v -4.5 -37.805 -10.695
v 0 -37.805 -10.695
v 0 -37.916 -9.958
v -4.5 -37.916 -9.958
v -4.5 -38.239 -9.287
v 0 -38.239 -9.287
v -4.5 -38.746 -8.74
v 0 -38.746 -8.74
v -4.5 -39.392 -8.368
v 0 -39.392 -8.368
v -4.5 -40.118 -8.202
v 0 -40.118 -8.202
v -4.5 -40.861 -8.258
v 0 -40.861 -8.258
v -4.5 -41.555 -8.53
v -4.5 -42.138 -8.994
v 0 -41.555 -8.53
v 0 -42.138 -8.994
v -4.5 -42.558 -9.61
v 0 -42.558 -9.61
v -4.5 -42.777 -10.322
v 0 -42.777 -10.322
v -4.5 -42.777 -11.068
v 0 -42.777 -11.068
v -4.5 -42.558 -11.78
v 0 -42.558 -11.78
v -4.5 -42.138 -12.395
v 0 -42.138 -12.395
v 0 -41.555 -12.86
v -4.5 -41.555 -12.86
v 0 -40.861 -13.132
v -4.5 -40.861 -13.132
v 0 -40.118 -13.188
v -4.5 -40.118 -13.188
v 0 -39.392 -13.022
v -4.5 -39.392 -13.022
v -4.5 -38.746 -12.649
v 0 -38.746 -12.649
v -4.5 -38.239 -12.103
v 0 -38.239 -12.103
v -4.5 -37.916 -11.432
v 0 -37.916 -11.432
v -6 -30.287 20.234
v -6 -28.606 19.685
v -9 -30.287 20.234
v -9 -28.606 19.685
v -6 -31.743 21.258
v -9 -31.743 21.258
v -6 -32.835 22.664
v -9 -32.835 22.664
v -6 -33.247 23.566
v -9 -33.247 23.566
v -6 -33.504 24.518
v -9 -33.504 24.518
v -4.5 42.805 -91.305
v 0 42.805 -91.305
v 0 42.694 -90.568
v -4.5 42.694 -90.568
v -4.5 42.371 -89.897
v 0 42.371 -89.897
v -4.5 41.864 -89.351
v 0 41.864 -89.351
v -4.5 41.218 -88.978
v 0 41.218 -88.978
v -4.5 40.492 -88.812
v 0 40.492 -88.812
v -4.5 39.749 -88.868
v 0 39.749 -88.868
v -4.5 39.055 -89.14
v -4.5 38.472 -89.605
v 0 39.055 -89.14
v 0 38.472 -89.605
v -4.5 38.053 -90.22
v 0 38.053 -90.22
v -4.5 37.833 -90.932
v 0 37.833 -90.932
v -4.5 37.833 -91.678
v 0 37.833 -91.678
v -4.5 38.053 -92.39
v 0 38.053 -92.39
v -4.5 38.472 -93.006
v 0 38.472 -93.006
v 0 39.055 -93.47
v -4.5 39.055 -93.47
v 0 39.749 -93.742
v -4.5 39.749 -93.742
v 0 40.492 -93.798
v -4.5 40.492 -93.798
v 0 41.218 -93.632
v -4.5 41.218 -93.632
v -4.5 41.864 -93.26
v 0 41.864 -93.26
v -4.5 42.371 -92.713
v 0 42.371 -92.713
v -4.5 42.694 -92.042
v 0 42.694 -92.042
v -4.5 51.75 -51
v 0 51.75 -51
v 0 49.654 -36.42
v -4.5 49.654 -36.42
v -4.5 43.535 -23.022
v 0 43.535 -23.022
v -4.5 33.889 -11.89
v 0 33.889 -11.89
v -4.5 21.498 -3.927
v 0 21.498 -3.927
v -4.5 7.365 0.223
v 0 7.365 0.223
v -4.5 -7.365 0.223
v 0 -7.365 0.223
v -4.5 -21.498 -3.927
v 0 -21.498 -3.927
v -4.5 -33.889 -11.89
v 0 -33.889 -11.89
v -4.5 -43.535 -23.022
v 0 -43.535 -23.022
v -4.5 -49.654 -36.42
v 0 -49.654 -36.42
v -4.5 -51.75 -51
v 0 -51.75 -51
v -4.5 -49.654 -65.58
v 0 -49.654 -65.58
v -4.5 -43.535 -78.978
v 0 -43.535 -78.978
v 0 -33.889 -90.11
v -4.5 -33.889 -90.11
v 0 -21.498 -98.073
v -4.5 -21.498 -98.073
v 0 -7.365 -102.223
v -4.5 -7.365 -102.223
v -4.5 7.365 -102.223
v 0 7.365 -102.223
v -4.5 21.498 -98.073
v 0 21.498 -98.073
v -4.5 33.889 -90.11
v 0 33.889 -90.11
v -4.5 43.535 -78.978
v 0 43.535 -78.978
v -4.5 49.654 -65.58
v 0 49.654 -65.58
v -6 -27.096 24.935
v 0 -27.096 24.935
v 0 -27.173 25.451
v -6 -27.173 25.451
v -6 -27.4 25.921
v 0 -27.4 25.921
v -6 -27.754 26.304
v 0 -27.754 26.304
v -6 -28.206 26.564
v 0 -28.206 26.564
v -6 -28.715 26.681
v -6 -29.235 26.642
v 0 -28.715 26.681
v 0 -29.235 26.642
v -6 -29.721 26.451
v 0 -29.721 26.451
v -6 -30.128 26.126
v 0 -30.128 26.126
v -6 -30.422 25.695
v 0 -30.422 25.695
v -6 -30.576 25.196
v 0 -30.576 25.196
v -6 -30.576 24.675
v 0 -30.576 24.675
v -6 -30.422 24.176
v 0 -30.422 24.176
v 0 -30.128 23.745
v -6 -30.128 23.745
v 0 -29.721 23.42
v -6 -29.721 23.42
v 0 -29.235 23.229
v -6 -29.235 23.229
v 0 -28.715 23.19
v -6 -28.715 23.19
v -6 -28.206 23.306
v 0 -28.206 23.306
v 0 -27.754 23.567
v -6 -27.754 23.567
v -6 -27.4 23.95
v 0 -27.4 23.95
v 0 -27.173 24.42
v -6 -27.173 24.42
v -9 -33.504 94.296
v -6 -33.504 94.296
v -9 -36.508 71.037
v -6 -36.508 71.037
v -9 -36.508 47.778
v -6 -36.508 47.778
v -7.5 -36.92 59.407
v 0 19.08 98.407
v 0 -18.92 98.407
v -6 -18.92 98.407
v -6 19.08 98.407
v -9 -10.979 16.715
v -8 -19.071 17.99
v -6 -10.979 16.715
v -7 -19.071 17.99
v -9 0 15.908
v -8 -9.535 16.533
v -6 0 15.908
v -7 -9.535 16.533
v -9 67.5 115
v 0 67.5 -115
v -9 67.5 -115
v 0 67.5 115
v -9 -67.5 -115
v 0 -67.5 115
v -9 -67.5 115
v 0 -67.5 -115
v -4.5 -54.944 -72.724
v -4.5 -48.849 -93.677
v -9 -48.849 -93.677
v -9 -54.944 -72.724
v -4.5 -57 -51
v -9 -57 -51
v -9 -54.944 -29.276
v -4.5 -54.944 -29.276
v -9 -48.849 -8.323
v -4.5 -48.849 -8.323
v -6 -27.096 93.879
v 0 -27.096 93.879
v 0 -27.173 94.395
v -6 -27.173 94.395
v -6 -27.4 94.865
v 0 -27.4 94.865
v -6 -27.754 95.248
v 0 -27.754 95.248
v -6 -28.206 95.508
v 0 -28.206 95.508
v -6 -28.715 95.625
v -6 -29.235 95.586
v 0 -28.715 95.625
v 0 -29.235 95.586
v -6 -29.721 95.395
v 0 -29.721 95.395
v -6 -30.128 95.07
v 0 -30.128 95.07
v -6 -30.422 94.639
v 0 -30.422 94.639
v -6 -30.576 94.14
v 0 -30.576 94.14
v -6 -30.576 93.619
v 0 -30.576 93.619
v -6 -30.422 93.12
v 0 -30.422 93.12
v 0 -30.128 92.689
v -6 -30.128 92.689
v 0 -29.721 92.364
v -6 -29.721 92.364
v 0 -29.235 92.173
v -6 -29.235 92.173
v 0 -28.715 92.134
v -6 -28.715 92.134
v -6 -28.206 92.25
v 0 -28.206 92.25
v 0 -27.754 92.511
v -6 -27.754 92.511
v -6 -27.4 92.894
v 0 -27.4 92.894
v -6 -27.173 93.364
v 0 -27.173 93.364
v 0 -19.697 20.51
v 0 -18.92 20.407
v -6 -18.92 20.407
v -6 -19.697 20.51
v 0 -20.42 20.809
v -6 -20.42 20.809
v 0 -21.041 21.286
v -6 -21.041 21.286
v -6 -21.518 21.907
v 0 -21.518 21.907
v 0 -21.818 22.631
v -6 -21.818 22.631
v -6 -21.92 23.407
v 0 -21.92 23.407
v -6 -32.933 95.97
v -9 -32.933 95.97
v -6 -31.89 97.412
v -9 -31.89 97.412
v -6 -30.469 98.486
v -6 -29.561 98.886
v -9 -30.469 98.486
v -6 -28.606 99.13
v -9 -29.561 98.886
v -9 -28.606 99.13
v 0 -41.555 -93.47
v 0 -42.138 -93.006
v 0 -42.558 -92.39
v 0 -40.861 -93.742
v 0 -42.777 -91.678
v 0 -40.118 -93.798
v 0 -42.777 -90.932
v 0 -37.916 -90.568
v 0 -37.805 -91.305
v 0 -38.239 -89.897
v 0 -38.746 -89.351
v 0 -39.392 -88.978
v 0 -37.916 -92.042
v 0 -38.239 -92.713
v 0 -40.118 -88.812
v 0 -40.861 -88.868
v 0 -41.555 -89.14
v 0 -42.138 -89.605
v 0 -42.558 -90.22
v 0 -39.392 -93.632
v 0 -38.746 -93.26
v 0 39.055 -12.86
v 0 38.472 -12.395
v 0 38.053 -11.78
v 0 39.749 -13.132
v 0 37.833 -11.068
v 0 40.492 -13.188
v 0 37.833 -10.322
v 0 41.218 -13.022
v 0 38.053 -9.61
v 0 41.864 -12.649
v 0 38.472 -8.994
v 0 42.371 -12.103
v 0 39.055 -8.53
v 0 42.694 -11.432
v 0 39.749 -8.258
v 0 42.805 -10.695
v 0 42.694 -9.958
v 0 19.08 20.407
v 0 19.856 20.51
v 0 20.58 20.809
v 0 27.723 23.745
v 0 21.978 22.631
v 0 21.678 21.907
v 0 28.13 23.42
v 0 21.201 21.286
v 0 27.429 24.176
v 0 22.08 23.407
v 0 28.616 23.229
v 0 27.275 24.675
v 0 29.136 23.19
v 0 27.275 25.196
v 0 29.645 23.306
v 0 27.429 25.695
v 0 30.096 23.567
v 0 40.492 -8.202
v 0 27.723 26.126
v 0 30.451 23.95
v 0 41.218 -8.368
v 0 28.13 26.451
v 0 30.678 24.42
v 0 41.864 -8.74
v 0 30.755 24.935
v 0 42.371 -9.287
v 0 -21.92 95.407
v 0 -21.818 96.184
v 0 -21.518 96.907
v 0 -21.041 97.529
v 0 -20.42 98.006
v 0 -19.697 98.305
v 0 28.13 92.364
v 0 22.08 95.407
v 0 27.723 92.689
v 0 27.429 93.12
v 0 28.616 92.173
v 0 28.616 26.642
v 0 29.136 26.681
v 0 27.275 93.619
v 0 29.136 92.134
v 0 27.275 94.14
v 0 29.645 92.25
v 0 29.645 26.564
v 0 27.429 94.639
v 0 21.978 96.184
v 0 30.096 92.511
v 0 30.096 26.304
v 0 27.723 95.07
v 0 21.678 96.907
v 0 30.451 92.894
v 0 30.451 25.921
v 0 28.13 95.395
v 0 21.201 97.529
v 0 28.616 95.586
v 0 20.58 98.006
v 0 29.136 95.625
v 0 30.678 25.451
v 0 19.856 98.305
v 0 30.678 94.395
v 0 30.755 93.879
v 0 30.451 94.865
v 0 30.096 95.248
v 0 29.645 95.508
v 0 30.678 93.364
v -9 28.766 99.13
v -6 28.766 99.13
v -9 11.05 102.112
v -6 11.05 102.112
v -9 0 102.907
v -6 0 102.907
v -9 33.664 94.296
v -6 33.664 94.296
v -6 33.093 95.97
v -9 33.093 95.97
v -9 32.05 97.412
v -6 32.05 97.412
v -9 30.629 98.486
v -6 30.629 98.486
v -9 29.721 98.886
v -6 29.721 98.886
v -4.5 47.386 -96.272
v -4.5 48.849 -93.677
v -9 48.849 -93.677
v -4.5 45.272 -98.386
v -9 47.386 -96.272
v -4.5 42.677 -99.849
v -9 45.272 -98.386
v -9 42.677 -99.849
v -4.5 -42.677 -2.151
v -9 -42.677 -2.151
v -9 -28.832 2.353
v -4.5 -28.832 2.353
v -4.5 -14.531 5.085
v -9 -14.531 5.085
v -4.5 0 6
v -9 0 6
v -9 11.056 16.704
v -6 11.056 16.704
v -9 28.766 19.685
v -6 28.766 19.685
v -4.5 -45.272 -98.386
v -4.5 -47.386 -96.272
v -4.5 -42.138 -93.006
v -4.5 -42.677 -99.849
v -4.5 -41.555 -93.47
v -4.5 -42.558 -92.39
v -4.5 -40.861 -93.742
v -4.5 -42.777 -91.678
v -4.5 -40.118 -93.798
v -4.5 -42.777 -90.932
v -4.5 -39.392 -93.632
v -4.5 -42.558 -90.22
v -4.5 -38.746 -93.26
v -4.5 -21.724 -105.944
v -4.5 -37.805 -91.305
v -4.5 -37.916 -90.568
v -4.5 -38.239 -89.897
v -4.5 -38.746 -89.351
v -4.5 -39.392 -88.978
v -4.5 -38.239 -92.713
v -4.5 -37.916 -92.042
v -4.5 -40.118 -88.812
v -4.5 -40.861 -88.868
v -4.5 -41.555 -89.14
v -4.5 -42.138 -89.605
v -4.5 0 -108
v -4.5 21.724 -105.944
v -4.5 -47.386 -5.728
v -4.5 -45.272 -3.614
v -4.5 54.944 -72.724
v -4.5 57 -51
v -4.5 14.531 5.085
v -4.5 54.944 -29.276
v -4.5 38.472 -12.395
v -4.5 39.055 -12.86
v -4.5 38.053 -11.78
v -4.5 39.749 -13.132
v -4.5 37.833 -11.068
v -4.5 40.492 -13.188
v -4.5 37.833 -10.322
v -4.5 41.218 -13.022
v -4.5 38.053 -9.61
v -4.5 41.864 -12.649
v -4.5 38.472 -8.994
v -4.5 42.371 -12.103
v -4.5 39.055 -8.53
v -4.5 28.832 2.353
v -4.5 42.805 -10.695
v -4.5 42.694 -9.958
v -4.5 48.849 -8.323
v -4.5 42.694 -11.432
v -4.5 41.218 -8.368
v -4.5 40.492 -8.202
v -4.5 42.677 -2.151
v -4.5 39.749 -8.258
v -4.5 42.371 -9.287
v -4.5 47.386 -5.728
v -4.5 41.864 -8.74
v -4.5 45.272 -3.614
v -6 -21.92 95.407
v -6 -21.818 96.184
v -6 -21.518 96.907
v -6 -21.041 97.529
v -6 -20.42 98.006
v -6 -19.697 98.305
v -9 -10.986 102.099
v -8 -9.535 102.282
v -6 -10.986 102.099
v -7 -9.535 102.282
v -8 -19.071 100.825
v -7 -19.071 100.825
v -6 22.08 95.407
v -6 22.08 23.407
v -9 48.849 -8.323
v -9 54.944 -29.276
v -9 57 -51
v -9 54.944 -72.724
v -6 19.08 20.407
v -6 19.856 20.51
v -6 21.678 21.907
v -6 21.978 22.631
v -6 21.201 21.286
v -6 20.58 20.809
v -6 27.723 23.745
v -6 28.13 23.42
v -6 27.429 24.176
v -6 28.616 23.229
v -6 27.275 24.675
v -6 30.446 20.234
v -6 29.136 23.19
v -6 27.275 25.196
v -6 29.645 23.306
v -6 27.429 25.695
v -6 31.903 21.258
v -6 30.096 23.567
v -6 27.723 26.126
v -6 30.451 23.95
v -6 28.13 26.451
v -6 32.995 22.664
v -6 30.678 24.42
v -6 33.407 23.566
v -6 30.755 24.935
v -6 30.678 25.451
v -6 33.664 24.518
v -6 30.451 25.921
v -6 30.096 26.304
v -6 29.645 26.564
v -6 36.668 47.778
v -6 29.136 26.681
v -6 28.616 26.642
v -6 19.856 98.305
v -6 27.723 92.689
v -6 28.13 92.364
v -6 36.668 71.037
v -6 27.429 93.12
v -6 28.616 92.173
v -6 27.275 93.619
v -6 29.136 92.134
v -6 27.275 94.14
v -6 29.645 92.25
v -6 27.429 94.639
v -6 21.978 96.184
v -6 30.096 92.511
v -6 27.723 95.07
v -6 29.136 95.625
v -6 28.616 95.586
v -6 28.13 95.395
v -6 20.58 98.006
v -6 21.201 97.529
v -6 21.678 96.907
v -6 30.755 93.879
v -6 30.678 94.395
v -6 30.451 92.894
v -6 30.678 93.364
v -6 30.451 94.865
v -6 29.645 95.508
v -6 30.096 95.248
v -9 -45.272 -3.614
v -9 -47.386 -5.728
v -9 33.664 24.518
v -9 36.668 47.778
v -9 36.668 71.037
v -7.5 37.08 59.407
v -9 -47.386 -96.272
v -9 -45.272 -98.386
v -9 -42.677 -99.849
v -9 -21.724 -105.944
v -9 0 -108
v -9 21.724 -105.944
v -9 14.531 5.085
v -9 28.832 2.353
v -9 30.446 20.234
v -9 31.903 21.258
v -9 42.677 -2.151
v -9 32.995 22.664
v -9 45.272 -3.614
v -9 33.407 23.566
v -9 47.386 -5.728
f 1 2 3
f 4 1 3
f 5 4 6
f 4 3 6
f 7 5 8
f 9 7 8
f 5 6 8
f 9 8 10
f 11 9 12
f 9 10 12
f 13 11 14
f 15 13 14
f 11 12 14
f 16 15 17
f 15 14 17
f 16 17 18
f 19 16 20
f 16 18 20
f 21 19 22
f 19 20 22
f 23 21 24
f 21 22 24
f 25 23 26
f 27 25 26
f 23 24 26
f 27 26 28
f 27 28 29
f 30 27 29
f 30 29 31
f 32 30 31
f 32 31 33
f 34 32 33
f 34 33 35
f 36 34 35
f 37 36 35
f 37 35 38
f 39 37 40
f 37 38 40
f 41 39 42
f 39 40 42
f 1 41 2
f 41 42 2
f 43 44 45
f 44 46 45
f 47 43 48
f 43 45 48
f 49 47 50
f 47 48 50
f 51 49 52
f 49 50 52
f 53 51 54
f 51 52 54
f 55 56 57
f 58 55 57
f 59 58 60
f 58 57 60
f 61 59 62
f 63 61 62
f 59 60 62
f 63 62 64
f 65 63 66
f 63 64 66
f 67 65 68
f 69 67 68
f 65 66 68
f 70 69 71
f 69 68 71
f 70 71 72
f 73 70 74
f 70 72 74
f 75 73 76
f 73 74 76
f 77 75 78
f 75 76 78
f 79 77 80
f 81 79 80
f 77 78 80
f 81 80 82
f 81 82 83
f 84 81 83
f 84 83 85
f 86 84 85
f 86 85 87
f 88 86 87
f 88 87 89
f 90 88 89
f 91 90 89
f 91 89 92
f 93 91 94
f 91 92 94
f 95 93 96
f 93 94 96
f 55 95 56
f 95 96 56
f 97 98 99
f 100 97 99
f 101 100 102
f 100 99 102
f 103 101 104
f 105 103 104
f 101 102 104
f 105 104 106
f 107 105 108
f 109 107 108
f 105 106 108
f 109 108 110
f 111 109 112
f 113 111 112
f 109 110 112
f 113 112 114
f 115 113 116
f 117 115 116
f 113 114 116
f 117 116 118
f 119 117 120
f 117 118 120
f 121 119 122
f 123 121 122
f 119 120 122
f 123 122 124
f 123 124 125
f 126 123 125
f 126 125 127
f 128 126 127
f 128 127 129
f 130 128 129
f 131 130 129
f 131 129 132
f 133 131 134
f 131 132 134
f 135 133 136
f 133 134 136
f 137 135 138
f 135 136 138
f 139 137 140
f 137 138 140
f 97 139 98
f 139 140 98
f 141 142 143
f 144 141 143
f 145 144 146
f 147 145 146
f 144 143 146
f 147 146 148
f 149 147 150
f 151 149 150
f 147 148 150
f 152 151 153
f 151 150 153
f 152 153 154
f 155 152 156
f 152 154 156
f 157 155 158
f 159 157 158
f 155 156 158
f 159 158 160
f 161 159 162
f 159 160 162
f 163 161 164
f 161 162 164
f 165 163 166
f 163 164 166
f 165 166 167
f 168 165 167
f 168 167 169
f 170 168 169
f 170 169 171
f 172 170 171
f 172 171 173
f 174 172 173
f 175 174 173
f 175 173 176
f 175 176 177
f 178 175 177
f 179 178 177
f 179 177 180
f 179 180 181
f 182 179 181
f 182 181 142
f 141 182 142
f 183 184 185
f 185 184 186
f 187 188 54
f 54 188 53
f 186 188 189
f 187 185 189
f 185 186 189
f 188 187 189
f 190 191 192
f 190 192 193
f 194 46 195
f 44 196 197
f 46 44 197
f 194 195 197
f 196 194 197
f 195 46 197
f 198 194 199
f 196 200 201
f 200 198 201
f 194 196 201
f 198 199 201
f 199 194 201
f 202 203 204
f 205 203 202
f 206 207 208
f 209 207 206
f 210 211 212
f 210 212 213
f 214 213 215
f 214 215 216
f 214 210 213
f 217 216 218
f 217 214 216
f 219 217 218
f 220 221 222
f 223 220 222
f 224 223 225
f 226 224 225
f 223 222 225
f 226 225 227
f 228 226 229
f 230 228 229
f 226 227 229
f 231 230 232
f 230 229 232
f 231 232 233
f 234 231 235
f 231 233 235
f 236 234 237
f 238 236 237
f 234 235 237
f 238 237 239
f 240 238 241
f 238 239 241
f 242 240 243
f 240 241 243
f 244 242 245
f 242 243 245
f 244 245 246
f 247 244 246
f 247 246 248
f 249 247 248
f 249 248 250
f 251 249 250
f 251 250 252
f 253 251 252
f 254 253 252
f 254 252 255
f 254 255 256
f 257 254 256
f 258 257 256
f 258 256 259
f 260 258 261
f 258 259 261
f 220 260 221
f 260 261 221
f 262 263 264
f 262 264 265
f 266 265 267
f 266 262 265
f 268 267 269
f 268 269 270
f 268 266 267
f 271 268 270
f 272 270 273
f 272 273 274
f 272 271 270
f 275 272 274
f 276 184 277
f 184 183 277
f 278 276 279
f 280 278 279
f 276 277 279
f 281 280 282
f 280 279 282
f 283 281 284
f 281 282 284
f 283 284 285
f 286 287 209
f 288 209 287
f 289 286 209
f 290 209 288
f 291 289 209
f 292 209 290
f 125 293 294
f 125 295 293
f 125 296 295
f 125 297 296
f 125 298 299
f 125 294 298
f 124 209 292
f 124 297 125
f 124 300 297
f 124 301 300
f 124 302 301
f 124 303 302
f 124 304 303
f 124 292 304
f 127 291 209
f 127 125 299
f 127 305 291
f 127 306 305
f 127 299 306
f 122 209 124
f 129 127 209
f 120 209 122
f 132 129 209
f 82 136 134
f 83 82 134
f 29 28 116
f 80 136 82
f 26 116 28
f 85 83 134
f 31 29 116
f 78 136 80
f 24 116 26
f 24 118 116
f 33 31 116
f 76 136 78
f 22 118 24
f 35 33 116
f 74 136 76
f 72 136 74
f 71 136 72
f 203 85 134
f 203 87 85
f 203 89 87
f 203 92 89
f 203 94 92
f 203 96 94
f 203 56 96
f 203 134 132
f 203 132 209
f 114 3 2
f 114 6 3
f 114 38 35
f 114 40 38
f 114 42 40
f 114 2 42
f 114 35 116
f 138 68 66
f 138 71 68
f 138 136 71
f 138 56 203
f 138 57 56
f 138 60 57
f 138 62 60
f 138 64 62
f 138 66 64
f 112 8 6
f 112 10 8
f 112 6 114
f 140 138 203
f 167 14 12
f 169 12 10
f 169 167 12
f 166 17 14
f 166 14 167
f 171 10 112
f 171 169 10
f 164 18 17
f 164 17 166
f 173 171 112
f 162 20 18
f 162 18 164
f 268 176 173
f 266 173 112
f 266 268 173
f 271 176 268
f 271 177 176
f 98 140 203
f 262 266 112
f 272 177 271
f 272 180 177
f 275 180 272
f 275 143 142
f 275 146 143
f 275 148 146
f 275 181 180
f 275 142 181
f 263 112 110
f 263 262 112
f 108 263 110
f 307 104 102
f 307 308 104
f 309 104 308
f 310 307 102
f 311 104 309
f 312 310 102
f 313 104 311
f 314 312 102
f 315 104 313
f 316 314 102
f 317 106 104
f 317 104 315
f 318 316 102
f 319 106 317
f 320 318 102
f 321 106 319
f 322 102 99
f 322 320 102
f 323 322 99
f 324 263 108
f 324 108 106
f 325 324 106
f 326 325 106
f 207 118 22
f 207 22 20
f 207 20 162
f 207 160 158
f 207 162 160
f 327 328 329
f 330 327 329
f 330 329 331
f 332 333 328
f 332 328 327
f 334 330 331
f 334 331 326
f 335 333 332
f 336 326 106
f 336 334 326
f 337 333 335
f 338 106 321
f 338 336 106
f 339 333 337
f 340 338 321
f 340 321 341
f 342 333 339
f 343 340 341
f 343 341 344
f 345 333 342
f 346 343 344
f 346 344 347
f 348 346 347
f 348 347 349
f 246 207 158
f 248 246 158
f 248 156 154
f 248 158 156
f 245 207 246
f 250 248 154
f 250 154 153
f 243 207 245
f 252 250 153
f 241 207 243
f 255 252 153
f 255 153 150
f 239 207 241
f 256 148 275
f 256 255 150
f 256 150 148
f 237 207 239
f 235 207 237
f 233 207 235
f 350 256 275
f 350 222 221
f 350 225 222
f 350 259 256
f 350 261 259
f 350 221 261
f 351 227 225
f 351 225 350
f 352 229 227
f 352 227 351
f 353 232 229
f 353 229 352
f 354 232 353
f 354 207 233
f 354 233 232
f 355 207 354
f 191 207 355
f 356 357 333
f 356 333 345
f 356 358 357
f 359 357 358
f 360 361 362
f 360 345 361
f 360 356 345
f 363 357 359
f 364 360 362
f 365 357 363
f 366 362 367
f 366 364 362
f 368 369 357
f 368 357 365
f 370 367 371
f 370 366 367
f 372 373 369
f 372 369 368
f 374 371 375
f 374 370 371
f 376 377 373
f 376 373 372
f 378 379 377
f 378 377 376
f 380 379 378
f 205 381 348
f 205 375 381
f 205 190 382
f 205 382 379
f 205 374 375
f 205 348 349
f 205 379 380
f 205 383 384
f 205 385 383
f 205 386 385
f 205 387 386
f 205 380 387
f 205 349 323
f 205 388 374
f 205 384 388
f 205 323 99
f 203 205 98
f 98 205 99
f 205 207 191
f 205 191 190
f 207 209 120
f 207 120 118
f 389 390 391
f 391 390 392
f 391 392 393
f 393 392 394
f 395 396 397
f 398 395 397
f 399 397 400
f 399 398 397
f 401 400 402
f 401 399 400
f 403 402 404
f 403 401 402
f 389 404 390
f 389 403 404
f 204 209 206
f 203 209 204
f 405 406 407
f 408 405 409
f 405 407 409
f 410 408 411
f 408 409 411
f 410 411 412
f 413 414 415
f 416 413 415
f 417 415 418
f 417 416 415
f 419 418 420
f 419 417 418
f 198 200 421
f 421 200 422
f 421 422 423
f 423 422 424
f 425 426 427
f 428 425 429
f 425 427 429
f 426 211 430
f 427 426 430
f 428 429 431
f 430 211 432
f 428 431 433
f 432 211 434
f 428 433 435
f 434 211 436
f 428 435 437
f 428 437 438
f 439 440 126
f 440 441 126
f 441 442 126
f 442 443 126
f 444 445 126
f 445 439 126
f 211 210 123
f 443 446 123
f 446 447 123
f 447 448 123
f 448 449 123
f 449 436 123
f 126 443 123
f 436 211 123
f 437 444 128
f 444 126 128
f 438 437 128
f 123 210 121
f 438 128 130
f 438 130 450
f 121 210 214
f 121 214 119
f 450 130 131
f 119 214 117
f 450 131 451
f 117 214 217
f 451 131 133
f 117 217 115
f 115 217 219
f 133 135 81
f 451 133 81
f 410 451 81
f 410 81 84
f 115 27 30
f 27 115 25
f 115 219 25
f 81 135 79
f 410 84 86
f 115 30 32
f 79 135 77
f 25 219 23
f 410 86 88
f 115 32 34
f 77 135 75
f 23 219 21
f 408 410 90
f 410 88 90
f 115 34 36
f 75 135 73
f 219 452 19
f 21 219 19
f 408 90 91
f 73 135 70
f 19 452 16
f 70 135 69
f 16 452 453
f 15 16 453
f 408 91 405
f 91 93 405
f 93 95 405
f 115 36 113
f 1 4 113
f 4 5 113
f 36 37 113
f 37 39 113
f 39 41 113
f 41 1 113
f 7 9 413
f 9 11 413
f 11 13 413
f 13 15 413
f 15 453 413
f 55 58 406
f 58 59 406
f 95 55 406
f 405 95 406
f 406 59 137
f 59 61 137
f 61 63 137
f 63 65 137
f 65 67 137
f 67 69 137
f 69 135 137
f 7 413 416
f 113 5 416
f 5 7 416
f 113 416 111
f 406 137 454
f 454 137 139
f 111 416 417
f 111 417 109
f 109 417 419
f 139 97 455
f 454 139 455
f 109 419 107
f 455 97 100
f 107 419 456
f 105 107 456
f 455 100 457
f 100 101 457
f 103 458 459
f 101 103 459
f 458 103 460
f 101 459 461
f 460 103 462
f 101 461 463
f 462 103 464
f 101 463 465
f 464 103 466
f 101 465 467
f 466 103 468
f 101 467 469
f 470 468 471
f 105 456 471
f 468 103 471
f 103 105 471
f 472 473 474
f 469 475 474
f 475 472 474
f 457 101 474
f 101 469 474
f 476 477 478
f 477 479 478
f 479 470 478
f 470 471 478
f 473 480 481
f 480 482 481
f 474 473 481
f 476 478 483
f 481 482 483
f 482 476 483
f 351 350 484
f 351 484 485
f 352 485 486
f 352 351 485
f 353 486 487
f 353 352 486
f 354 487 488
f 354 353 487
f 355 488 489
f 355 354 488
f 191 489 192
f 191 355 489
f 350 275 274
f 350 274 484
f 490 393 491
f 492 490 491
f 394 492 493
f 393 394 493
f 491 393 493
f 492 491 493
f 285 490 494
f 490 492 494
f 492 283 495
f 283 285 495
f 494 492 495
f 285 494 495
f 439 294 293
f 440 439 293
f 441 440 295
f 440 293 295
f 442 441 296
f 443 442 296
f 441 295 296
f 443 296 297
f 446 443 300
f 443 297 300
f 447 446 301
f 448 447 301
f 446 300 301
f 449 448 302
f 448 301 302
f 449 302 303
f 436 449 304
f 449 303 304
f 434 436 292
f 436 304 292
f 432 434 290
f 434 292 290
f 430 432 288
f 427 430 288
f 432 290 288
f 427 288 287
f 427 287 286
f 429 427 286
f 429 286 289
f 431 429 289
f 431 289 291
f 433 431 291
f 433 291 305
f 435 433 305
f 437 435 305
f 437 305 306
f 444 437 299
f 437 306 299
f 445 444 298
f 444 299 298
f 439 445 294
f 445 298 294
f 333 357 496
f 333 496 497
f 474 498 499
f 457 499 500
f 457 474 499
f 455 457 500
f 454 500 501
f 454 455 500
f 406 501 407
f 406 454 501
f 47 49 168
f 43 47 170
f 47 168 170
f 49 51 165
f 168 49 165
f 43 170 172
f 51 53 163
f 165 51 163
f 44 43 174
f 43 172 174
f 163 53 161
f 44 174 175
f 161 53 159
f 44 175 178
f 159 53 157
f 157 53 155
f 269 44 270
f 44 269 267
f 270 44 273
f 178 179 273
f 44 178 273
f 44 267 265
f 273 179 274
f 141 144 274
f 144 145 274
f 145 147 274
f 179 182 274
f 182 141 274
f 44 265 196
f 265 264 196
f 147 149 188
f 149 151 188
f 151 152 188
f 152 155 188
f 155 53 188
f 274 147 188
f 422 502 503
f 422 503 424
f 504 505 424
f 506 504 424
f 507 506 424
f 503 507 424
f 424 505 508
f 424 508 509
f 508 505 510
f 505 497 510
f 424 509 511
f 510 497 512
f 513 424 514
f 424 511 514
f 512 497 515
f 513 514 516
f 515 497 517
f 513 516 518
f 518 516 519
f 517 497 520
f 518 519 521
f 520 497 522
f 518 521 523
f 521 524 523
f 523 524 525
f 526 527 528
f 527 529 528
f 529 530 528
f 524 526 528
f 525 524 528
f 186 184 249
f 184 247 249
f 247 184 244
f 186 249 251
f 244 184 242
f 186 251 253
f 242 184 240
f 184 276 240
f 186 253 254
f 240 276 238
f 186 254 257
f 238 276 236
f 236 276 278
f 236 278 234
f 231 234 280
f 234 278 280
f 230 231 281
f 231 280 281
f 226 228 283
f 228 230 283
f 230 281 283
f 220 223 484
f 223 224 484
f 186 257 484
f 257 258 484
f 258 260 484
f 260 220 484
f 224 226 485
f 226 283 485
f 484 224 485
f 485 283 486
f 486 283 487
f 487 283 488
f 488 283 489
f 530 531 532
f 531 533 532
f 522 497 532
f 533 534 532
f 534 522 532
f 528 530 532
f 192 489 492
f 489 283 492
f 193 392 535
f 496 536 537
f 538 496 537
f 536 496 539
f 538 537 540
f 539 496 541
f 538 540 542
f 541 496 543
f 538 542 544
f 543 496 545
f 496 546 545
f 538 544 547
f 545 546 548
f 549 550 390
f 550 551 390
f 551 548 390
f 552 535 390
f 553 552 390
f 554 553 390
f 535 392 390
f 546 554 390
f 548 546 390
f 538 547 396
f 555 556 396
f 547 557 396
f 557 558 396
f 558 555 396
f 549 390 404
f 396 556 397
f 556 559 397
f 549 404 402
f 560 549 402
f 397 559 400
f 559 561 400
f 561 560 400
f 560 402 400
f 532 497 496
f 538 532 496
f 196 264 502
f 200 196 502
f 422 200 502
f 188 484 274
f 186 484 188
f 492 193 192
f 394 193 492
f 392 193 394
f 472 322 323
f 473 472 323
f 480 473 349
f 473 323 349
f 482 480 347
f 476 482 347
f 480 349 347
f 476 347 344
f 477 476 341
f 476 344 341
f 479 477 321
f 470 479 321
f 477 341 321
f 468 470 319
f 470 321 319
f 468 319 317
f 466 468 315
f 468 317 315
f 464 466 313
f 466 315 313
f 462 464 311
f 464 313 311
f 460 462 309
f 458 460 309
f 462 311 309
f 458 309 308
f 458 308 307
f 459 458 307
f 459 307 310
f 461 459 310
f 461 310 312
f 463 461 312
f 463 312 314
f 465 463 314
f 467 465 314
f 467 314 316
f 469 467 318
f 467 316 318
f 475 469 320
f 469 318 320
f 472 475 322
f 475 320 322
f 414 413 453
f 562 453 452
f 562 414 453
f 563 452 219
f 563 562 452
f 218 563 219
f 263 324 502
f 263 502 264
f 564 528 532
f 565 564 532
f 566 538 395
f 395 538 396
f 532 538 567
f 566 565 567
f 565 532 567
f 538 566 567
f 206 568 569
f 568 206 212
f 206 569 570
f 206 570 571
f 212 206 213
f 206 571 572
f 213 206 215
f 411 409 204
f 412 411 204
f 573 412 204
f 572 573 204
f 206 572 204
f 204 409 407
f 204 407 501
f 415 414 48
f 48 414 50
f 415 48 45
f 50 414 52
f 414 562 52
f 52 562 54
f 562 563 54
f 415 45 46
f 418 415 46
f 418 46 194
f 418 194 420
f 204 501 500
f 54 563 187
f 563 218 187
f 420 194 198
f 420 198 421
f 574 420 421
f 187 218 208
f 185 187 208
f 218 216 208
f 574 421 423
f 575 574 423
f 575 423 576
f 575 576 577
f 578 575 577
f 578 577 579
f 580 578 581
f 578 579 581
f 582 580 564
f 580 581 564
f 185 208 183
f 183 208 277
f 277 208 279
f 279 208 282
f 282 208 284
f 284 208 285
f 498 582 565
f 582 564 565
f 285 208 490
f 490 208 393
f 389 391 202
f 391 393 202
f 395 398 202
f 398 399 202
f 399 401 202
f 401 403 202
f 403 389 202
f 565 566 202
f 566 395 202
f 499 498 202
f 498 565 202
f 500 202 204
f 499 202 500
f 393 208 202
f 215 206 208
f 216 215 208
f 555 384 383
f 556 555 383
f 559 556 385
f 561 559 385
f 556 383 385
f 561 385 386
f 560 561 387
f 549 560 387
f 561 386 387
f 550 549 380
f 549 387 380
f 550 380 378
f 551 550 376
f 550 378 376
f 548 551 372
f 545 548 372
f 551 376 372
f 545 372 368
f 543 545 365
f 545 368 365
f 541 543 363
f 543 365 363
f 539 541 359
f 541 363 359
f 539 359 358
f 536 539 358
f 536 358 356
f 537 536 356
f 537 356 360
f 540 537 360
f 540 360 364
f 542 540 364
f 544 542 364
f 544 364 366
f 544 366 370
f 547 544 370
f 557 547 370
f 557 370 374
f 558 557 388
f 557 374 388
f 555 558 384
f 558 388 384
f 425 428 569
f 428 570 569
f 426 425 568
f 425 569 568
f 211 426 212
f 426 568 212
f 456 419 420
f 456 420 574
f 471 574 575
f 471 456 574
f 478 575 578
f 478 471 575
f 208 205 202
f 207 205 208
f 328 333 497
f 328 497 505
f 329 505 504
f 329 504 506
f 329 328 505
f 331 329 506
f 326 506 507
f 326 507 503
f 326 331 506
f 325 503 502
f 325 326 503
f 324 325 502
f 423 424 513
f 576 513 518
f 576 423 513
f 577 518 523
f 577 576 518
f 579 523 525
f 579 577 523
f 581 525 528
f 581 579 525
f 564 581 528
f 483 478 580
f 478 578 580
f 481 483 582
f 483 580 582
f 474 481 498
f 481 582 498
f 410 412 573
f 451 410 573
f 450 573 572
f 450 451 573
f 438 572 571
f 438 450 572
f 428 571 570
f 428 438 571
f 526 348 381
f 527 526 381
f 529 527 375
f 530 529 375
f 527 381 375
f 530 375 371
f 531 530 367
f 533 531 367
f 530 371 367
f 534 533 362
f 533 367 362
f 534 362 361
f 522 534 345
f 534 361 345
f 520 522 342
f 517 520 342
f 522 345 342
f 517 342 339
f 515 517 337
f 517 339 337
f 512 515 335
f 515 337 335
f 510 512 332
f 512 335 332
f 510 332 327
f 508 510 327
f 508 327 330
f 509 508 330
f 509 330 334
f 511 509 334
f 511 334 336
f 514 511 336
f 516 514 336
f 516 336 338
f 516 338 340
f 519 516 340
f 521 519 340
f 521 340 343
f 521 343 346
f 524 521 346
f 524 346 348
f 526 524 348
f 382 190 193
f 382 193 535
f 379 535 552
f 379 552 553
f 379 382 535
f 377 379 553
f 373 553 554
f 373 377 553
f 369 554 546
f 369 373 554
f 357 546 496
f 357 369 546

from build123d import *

# Parameters (mm, degrees)
F1_DEPTH = 9
F0_R     = 2.5
F0_R_2   = 51.75
F2_DEPTH = 4.5
F0_R_3   = 3
F0_R_4   = 1.75
F3_R     = 11
F4_DEPTH = 6
F5_R     = 6


# Not quite as in the source:
# - a feature names something its author has since deleted; it is built from what else it names


with BuildPart() as f1:
    # F0 (on Right) → F1 (new body)
    with BuildSketch(Plane.YZ):
        Polygon((67.5, -115), (67.5, 115), (0, 115), (-67.5, 115), (-67.5, -115), align=None)
        with BuildLine():
            ThreePointArc((-47.0226009489, -3.9773990511), (-24.0347326375, 3.4781900517), (0, 6))
            ThreePointArc((0, 6), (24.0347326375, 3.4781900517), (47.0226009489, -3.9773990511))
            ThreePointArc((47.0226009489, -3.9773990511), (57, -51), (47.0226009489, -98.0226009489))
            ThreePointArc((47.0226009489, -98.0226009489), (0, -108), (-47.0226009489, -98.0226009489))
            ThreePointArc((-47.0226009489, -98.0226009489), (-57, -51), (-47.0226009489, -3.9773990511))
        make_face(mode=Mode.SUBTRACT)
        with BuildLine():
            add(Edge.make_bspline(
                [(0, 102.9074018363), (-10.9007532398, 102.8937314348), (-21.8015064796, 100.0876465048), (-32.7022597194, 98.4757185701)],
                knots=[0.5012187781, 0.5012187781, 0.5012187781, 0.5012187781, 1, 1, 1, 1], degree=3))
            add(Edge.make_bspline(
                [(32.8620764687, 98.4757185701), (21.934687104, 100.0915852706), (10.9806616144, 102.9143158042), (0.0266361249, 102.9074352401), (0, 102.9074018363)],
                knots=[0, 0, 0, 0, 0.5, 0.5012187781, 0.5012187781, 0.5012187781, 0.5012187781], degree=3))
            add(Edge.make_bspline(
                [(32.8620764687, 20.339185372), (35.4709924216, 33.361940905), (38.6888243276, 59.4074519711), (35.4709924216, 85.4529630371), (32.8620764687, 98.4757185701)],
                knots=[0, 0, 0, 0, 0.5, 1, 1, 1, 1], degree=3))
            add(Edge.make_bspline(
                [(0, 15.9075021058), (0.0266361249, 15.907468702), (10.9806616144, 15.9005881379), (21.934687104, 18.7233186715), (32.8620764687, 20.339185372)],
                knots=[0.4987812219, 0.4987812219, 0.4987812219, 0.4987812219, 0.5, 1, 1, 1, 1], degree=3))
            add(Edge.make_bspline(
                [(-32.7022597194, 20.339185372), (-21.8015064796, 18.7272574373), (-10.9007532398, 15.9211725073), (0, 15.9075021058)],
                knots=[0, 0, 0, 0, 0.4987812219, 0.4987812219, 0.4987812219, 0.4987812219], degree=3))
            add(Edge.make_bspline(
                [(-32.7022597194, 98.4757185701), (-35.3111756724, 85.4529630371), (-38.5290075784, 59.4074519711), (-35.3111756724, 33.361940905), (-32.7022597194, 20.339185372)],
                knots=[0, 0, 0, 0, 0.5, 1, 1, 1, 1], degree=3))
        make_face(mode=Mode.SUBTRACT)
    extrude(amount=-F1_DEPTH)

    # F0 (on Right) → F2 (join)
    with BuildSketch(Plane.YZ):
        with BuildLine():
            ThreePointArc((47.0226009489, -3.9773990511), (24.0347326375, 3.4781900517), (0, 6))
            ThreePointArc((0, 6), (-24.0347326375, 3.4781900517), (-47.0226009489, -3.9773990511))
            ThreePointArc((-47.0226009489, -3.9773990511), (-57, -51), (-47.0226009489, -98.0226009489))
            ThreePointArc((-47.0226009489, -98.0226009489), (0, -108), (47.0226009489, -98.0226009489))
            ThreePointArc((47.0226009489, -98.0226009489), (57, -51), (47.0226009489, -3.9773990511))
        make_face()
        with Locations((-40.3050865276, -91.3050865276)):
            Circle(F0_R, mode=Mode.SUBTRACT)
        with Locations((-40.3050865276, -10.6949134724)):
            Circle(F0_R, mode=Mode.SUBTRACT)
        with Locations((40.3050865276, -91.3050865276)):
            Circle(F0_R, mode=Mode.SUBTRACT)
        with Locations((0, -51)):
            Circle(F0_R_2, mode=Mode.SUBTRACT)
        with Locations((40.3050865276, -10.6949134724)):
            Circle(F0_R, mode=Mode.SUBTRACT)
    extrude(amount=-F2_DEPTH)

    # F3
    f3_edges = [f1.edges().sort_by_distance(p)[0] for p in [
        (-6.75, 47.022601, -3.977399),
        (-6.75, -47.022601, -3.977399),
        (-6.75, -47.022601, -98.022601),
        (-6.75, 47.022601, -98.022601),
    ]]
    fillet(f3_edges, radius=F3_R)



with BuildPart() as f2:
    # F0 (on Right) → F2, piece 2 (new body)
    with BuildSketch(Plane.YZ):
        with Locations((-28.8455340613, 24.9354520307)):
            Circle(F0_R_3)
        with Locations((-28.8455340613, 24.9354520307)):
            Circle(F0_R_4, mode=Mode.SUBTRACT)
    extrude(amount=-F2_DEPTH)


with BuildPart() as f2b:
    # F0 (on Right) → F2, piece 3 (new body)
    with BuildSketch(Plane.YZ):
        with Locations((29.0053508105, 24.9354520307)):
            Circle(F0_R_3)
        with Locations((29.0053508105, 24.9354520307)):
            Circle(F0_R_4, mode=Mode.SUBTRACT)
    extrude(amount=-F2_DEPTH)


with BuildPart() as f1_1:
    add(f1.part)

    add(f2.part)  # F4 merges F2

    add(f2b.part)  # F4 merges F2b
    # F0 (on Right) → F4 (join)
    with BuildSketch(Plane.YZ):
        with BuildLine():
            add(Edge.make_bspline(
                [(32.8620764687, 98.4757185701), (21.934687104, 100.0915852706), (10.9806616144, 102.9143158042), (0.0266361249, 102.9074352401), (0, 102.9074018363)],
                knots=[0, 0, 0, 0, 0.5, 0.5012187781, 0.5012187781, 0.5012187781, 0.5012187781], degree=3))
            Line((0, 102.9074018363), (0, 98.4074519711))
            Line((0, 98.4074519711), (19.0799083746, 98.4074519711))
            ThreePointArc((19.0799083746, 98.4074519711), (21.2012287182, 97.5287723146), (22.0799083746, 95.4074519711))
            Line((22.0799083746, 95.4074519711), (22.0799083746, 23.4074519711))
            ThreePointArc((22.0799083746, 23.4074519711), (21.2012287182, 21.2861316275), (19.0799083746, 20.4074519711))
            Line((19.0799083746, 20.4074519711), (0, 20.4074519711))
            Line((0, 20.4074519711), (0, 15.9075021058))
            add(Edge.make_bspline(
                [(0, 15.9075021058), (0.0266361249, 15.907468702), (10.9806616144, 15.9005881379), (21.934687104, 18.7233186715), (32.8620764687, 20.339185372)],
                knots=[0.4987812219, 0.4987812219, 0.4987812219, 0.4987812219, 0.5, 1, 1, 1, 1], degree=3))
            add(Edge.make_bspline(
                [(32.8620764687, 20.339185372), (35.4709924216, 33.361940905), (38.6888243276, 59.4074519711), (35.4709924216, 85.4529630371), (32.8620764687, 98.4757185701)],
                knots=[0, 0, 0, 0, 0.5, 1, 1, 1, 1], degree=3))
        make_face()
        with Locations((29.0053508105, 24.9354520307)):
            Circle(F0_R_3, mode=Mode.SUBTRACT)
        with Locations((29.0053508105, 93.8794519114)):
            Circle(F0_R_3, mode=Mode.SUBTRACT)
        with BuildLine():
            Line((0, 98.4074519711), (0, 102.9074018363))
            add(Edge.make_bspline(
                [(0, 102.9074018363), (-10.9007532398, 102.8937314348), (-21.8015064796, 100.0876465048), (-32.7022597194, 98.4757185701)],
                knots=[0.5012187781, 0.5012187781, 0.5012187781, 0.5012187781, 1, 1, 1, 1], degree=3))
            add(Edge.make_bspline(
                [(-32.7022597194, 98.4757185701), (-35.3111756724, 85.4529630371), (-38.5290075784, 59.4074519711), (-35.3111756724, 33.361940905), (-32.7022597194, 20.339185372)],
                knots=[0, 0, 0, 0, 0.5, 1, 1, 1, 1], degree=3))
            add(Edge.make_bspline(
                [(-32.7022597194, 20.339185372), (-21.8015064796, 18.7272574373), (-10.9007532398, 15.9211725073), (0, 15.9075021058)],
                knots=[0, 0, 0, 0, 0.4987812219, 0.4987812219, 0.4987812219, 0.4987812219], degree=3))
            Line((0, 15.9075021058), (0, 20.4074519711))
            Line((0, 20.4074519711), (-18.9200916254, 20.4074519711))
            ThreePointArc((-18.9200916254, 20.4074519711), (-21.0414119689, 21.2861316275), (-21.9200916254, 23.4074519711))
            Line((-21.9200916254, 23.4074519711), (-21.9200916254, 95.4074519711))
            ThreePointArc((-21.9200916254, 95.4074519711), (-21.0414119689, 97.5287723146), (-18.9200916254, 98.4074519711))
            Line((-18.9200916254, 98.4074519711), (0, 98.4074519711))
        make_face()
        with Locations((-28.8455340613, 24.9354520307)):
            Circle(F0_R_3, mode=Mode.SUBTRACT)
        with Locations((-28.8455340613, 93.8794519114)):
            Circle(F0_R_3, mode=Mode.SUBTRACT)
        with Locations((29.0053508105, 93.8794519114)):
            Circle(F0_R_3)
        with Locations((29.0053508105, 93.8794519114)):
            Circle(F0_R_4, mode=Mode.SUBTRACT)
        with Locations((-28.8455340613, 93.8794519114)):
            Circle(F0_R_3)
        with Locations((-28.8455340613, 93.8794519114)):
            Circle(F0_R_4, mode=Mode.SUBTRACT)
        with Locations((-28.8455340613, 24.9354520307)):
            Circle(F0_R_3)
        with Locations((-28.8455340613, 24.9354520307)):
            Circle(F0_R_4, mode=Mode.SUBTRACT)
        with Locations((29.0053508105, 24.9354520307)):
            Circle(F0_R_3)
        with Locations((29.0053508105, 24.9354520307)):
            Circle(F0_R_4, mode=Mode.SUBTRACT)
    extrude(amount=-F4_DEPTH)

    # F5
    f5_edges = [f1_1.edges().sort_by_distance(p)[0] for p in [
        (-7.5, 32.862076, 98.475719),
        (-7.5, 32.862076, 20.339185),
        (-7.5, -32.70226, 20.339185),
        (-7.5, -32.70226, 98.475719),
    ]]
    fillet(f5_edges, radius=F5_R)


solid = f1_1.part
